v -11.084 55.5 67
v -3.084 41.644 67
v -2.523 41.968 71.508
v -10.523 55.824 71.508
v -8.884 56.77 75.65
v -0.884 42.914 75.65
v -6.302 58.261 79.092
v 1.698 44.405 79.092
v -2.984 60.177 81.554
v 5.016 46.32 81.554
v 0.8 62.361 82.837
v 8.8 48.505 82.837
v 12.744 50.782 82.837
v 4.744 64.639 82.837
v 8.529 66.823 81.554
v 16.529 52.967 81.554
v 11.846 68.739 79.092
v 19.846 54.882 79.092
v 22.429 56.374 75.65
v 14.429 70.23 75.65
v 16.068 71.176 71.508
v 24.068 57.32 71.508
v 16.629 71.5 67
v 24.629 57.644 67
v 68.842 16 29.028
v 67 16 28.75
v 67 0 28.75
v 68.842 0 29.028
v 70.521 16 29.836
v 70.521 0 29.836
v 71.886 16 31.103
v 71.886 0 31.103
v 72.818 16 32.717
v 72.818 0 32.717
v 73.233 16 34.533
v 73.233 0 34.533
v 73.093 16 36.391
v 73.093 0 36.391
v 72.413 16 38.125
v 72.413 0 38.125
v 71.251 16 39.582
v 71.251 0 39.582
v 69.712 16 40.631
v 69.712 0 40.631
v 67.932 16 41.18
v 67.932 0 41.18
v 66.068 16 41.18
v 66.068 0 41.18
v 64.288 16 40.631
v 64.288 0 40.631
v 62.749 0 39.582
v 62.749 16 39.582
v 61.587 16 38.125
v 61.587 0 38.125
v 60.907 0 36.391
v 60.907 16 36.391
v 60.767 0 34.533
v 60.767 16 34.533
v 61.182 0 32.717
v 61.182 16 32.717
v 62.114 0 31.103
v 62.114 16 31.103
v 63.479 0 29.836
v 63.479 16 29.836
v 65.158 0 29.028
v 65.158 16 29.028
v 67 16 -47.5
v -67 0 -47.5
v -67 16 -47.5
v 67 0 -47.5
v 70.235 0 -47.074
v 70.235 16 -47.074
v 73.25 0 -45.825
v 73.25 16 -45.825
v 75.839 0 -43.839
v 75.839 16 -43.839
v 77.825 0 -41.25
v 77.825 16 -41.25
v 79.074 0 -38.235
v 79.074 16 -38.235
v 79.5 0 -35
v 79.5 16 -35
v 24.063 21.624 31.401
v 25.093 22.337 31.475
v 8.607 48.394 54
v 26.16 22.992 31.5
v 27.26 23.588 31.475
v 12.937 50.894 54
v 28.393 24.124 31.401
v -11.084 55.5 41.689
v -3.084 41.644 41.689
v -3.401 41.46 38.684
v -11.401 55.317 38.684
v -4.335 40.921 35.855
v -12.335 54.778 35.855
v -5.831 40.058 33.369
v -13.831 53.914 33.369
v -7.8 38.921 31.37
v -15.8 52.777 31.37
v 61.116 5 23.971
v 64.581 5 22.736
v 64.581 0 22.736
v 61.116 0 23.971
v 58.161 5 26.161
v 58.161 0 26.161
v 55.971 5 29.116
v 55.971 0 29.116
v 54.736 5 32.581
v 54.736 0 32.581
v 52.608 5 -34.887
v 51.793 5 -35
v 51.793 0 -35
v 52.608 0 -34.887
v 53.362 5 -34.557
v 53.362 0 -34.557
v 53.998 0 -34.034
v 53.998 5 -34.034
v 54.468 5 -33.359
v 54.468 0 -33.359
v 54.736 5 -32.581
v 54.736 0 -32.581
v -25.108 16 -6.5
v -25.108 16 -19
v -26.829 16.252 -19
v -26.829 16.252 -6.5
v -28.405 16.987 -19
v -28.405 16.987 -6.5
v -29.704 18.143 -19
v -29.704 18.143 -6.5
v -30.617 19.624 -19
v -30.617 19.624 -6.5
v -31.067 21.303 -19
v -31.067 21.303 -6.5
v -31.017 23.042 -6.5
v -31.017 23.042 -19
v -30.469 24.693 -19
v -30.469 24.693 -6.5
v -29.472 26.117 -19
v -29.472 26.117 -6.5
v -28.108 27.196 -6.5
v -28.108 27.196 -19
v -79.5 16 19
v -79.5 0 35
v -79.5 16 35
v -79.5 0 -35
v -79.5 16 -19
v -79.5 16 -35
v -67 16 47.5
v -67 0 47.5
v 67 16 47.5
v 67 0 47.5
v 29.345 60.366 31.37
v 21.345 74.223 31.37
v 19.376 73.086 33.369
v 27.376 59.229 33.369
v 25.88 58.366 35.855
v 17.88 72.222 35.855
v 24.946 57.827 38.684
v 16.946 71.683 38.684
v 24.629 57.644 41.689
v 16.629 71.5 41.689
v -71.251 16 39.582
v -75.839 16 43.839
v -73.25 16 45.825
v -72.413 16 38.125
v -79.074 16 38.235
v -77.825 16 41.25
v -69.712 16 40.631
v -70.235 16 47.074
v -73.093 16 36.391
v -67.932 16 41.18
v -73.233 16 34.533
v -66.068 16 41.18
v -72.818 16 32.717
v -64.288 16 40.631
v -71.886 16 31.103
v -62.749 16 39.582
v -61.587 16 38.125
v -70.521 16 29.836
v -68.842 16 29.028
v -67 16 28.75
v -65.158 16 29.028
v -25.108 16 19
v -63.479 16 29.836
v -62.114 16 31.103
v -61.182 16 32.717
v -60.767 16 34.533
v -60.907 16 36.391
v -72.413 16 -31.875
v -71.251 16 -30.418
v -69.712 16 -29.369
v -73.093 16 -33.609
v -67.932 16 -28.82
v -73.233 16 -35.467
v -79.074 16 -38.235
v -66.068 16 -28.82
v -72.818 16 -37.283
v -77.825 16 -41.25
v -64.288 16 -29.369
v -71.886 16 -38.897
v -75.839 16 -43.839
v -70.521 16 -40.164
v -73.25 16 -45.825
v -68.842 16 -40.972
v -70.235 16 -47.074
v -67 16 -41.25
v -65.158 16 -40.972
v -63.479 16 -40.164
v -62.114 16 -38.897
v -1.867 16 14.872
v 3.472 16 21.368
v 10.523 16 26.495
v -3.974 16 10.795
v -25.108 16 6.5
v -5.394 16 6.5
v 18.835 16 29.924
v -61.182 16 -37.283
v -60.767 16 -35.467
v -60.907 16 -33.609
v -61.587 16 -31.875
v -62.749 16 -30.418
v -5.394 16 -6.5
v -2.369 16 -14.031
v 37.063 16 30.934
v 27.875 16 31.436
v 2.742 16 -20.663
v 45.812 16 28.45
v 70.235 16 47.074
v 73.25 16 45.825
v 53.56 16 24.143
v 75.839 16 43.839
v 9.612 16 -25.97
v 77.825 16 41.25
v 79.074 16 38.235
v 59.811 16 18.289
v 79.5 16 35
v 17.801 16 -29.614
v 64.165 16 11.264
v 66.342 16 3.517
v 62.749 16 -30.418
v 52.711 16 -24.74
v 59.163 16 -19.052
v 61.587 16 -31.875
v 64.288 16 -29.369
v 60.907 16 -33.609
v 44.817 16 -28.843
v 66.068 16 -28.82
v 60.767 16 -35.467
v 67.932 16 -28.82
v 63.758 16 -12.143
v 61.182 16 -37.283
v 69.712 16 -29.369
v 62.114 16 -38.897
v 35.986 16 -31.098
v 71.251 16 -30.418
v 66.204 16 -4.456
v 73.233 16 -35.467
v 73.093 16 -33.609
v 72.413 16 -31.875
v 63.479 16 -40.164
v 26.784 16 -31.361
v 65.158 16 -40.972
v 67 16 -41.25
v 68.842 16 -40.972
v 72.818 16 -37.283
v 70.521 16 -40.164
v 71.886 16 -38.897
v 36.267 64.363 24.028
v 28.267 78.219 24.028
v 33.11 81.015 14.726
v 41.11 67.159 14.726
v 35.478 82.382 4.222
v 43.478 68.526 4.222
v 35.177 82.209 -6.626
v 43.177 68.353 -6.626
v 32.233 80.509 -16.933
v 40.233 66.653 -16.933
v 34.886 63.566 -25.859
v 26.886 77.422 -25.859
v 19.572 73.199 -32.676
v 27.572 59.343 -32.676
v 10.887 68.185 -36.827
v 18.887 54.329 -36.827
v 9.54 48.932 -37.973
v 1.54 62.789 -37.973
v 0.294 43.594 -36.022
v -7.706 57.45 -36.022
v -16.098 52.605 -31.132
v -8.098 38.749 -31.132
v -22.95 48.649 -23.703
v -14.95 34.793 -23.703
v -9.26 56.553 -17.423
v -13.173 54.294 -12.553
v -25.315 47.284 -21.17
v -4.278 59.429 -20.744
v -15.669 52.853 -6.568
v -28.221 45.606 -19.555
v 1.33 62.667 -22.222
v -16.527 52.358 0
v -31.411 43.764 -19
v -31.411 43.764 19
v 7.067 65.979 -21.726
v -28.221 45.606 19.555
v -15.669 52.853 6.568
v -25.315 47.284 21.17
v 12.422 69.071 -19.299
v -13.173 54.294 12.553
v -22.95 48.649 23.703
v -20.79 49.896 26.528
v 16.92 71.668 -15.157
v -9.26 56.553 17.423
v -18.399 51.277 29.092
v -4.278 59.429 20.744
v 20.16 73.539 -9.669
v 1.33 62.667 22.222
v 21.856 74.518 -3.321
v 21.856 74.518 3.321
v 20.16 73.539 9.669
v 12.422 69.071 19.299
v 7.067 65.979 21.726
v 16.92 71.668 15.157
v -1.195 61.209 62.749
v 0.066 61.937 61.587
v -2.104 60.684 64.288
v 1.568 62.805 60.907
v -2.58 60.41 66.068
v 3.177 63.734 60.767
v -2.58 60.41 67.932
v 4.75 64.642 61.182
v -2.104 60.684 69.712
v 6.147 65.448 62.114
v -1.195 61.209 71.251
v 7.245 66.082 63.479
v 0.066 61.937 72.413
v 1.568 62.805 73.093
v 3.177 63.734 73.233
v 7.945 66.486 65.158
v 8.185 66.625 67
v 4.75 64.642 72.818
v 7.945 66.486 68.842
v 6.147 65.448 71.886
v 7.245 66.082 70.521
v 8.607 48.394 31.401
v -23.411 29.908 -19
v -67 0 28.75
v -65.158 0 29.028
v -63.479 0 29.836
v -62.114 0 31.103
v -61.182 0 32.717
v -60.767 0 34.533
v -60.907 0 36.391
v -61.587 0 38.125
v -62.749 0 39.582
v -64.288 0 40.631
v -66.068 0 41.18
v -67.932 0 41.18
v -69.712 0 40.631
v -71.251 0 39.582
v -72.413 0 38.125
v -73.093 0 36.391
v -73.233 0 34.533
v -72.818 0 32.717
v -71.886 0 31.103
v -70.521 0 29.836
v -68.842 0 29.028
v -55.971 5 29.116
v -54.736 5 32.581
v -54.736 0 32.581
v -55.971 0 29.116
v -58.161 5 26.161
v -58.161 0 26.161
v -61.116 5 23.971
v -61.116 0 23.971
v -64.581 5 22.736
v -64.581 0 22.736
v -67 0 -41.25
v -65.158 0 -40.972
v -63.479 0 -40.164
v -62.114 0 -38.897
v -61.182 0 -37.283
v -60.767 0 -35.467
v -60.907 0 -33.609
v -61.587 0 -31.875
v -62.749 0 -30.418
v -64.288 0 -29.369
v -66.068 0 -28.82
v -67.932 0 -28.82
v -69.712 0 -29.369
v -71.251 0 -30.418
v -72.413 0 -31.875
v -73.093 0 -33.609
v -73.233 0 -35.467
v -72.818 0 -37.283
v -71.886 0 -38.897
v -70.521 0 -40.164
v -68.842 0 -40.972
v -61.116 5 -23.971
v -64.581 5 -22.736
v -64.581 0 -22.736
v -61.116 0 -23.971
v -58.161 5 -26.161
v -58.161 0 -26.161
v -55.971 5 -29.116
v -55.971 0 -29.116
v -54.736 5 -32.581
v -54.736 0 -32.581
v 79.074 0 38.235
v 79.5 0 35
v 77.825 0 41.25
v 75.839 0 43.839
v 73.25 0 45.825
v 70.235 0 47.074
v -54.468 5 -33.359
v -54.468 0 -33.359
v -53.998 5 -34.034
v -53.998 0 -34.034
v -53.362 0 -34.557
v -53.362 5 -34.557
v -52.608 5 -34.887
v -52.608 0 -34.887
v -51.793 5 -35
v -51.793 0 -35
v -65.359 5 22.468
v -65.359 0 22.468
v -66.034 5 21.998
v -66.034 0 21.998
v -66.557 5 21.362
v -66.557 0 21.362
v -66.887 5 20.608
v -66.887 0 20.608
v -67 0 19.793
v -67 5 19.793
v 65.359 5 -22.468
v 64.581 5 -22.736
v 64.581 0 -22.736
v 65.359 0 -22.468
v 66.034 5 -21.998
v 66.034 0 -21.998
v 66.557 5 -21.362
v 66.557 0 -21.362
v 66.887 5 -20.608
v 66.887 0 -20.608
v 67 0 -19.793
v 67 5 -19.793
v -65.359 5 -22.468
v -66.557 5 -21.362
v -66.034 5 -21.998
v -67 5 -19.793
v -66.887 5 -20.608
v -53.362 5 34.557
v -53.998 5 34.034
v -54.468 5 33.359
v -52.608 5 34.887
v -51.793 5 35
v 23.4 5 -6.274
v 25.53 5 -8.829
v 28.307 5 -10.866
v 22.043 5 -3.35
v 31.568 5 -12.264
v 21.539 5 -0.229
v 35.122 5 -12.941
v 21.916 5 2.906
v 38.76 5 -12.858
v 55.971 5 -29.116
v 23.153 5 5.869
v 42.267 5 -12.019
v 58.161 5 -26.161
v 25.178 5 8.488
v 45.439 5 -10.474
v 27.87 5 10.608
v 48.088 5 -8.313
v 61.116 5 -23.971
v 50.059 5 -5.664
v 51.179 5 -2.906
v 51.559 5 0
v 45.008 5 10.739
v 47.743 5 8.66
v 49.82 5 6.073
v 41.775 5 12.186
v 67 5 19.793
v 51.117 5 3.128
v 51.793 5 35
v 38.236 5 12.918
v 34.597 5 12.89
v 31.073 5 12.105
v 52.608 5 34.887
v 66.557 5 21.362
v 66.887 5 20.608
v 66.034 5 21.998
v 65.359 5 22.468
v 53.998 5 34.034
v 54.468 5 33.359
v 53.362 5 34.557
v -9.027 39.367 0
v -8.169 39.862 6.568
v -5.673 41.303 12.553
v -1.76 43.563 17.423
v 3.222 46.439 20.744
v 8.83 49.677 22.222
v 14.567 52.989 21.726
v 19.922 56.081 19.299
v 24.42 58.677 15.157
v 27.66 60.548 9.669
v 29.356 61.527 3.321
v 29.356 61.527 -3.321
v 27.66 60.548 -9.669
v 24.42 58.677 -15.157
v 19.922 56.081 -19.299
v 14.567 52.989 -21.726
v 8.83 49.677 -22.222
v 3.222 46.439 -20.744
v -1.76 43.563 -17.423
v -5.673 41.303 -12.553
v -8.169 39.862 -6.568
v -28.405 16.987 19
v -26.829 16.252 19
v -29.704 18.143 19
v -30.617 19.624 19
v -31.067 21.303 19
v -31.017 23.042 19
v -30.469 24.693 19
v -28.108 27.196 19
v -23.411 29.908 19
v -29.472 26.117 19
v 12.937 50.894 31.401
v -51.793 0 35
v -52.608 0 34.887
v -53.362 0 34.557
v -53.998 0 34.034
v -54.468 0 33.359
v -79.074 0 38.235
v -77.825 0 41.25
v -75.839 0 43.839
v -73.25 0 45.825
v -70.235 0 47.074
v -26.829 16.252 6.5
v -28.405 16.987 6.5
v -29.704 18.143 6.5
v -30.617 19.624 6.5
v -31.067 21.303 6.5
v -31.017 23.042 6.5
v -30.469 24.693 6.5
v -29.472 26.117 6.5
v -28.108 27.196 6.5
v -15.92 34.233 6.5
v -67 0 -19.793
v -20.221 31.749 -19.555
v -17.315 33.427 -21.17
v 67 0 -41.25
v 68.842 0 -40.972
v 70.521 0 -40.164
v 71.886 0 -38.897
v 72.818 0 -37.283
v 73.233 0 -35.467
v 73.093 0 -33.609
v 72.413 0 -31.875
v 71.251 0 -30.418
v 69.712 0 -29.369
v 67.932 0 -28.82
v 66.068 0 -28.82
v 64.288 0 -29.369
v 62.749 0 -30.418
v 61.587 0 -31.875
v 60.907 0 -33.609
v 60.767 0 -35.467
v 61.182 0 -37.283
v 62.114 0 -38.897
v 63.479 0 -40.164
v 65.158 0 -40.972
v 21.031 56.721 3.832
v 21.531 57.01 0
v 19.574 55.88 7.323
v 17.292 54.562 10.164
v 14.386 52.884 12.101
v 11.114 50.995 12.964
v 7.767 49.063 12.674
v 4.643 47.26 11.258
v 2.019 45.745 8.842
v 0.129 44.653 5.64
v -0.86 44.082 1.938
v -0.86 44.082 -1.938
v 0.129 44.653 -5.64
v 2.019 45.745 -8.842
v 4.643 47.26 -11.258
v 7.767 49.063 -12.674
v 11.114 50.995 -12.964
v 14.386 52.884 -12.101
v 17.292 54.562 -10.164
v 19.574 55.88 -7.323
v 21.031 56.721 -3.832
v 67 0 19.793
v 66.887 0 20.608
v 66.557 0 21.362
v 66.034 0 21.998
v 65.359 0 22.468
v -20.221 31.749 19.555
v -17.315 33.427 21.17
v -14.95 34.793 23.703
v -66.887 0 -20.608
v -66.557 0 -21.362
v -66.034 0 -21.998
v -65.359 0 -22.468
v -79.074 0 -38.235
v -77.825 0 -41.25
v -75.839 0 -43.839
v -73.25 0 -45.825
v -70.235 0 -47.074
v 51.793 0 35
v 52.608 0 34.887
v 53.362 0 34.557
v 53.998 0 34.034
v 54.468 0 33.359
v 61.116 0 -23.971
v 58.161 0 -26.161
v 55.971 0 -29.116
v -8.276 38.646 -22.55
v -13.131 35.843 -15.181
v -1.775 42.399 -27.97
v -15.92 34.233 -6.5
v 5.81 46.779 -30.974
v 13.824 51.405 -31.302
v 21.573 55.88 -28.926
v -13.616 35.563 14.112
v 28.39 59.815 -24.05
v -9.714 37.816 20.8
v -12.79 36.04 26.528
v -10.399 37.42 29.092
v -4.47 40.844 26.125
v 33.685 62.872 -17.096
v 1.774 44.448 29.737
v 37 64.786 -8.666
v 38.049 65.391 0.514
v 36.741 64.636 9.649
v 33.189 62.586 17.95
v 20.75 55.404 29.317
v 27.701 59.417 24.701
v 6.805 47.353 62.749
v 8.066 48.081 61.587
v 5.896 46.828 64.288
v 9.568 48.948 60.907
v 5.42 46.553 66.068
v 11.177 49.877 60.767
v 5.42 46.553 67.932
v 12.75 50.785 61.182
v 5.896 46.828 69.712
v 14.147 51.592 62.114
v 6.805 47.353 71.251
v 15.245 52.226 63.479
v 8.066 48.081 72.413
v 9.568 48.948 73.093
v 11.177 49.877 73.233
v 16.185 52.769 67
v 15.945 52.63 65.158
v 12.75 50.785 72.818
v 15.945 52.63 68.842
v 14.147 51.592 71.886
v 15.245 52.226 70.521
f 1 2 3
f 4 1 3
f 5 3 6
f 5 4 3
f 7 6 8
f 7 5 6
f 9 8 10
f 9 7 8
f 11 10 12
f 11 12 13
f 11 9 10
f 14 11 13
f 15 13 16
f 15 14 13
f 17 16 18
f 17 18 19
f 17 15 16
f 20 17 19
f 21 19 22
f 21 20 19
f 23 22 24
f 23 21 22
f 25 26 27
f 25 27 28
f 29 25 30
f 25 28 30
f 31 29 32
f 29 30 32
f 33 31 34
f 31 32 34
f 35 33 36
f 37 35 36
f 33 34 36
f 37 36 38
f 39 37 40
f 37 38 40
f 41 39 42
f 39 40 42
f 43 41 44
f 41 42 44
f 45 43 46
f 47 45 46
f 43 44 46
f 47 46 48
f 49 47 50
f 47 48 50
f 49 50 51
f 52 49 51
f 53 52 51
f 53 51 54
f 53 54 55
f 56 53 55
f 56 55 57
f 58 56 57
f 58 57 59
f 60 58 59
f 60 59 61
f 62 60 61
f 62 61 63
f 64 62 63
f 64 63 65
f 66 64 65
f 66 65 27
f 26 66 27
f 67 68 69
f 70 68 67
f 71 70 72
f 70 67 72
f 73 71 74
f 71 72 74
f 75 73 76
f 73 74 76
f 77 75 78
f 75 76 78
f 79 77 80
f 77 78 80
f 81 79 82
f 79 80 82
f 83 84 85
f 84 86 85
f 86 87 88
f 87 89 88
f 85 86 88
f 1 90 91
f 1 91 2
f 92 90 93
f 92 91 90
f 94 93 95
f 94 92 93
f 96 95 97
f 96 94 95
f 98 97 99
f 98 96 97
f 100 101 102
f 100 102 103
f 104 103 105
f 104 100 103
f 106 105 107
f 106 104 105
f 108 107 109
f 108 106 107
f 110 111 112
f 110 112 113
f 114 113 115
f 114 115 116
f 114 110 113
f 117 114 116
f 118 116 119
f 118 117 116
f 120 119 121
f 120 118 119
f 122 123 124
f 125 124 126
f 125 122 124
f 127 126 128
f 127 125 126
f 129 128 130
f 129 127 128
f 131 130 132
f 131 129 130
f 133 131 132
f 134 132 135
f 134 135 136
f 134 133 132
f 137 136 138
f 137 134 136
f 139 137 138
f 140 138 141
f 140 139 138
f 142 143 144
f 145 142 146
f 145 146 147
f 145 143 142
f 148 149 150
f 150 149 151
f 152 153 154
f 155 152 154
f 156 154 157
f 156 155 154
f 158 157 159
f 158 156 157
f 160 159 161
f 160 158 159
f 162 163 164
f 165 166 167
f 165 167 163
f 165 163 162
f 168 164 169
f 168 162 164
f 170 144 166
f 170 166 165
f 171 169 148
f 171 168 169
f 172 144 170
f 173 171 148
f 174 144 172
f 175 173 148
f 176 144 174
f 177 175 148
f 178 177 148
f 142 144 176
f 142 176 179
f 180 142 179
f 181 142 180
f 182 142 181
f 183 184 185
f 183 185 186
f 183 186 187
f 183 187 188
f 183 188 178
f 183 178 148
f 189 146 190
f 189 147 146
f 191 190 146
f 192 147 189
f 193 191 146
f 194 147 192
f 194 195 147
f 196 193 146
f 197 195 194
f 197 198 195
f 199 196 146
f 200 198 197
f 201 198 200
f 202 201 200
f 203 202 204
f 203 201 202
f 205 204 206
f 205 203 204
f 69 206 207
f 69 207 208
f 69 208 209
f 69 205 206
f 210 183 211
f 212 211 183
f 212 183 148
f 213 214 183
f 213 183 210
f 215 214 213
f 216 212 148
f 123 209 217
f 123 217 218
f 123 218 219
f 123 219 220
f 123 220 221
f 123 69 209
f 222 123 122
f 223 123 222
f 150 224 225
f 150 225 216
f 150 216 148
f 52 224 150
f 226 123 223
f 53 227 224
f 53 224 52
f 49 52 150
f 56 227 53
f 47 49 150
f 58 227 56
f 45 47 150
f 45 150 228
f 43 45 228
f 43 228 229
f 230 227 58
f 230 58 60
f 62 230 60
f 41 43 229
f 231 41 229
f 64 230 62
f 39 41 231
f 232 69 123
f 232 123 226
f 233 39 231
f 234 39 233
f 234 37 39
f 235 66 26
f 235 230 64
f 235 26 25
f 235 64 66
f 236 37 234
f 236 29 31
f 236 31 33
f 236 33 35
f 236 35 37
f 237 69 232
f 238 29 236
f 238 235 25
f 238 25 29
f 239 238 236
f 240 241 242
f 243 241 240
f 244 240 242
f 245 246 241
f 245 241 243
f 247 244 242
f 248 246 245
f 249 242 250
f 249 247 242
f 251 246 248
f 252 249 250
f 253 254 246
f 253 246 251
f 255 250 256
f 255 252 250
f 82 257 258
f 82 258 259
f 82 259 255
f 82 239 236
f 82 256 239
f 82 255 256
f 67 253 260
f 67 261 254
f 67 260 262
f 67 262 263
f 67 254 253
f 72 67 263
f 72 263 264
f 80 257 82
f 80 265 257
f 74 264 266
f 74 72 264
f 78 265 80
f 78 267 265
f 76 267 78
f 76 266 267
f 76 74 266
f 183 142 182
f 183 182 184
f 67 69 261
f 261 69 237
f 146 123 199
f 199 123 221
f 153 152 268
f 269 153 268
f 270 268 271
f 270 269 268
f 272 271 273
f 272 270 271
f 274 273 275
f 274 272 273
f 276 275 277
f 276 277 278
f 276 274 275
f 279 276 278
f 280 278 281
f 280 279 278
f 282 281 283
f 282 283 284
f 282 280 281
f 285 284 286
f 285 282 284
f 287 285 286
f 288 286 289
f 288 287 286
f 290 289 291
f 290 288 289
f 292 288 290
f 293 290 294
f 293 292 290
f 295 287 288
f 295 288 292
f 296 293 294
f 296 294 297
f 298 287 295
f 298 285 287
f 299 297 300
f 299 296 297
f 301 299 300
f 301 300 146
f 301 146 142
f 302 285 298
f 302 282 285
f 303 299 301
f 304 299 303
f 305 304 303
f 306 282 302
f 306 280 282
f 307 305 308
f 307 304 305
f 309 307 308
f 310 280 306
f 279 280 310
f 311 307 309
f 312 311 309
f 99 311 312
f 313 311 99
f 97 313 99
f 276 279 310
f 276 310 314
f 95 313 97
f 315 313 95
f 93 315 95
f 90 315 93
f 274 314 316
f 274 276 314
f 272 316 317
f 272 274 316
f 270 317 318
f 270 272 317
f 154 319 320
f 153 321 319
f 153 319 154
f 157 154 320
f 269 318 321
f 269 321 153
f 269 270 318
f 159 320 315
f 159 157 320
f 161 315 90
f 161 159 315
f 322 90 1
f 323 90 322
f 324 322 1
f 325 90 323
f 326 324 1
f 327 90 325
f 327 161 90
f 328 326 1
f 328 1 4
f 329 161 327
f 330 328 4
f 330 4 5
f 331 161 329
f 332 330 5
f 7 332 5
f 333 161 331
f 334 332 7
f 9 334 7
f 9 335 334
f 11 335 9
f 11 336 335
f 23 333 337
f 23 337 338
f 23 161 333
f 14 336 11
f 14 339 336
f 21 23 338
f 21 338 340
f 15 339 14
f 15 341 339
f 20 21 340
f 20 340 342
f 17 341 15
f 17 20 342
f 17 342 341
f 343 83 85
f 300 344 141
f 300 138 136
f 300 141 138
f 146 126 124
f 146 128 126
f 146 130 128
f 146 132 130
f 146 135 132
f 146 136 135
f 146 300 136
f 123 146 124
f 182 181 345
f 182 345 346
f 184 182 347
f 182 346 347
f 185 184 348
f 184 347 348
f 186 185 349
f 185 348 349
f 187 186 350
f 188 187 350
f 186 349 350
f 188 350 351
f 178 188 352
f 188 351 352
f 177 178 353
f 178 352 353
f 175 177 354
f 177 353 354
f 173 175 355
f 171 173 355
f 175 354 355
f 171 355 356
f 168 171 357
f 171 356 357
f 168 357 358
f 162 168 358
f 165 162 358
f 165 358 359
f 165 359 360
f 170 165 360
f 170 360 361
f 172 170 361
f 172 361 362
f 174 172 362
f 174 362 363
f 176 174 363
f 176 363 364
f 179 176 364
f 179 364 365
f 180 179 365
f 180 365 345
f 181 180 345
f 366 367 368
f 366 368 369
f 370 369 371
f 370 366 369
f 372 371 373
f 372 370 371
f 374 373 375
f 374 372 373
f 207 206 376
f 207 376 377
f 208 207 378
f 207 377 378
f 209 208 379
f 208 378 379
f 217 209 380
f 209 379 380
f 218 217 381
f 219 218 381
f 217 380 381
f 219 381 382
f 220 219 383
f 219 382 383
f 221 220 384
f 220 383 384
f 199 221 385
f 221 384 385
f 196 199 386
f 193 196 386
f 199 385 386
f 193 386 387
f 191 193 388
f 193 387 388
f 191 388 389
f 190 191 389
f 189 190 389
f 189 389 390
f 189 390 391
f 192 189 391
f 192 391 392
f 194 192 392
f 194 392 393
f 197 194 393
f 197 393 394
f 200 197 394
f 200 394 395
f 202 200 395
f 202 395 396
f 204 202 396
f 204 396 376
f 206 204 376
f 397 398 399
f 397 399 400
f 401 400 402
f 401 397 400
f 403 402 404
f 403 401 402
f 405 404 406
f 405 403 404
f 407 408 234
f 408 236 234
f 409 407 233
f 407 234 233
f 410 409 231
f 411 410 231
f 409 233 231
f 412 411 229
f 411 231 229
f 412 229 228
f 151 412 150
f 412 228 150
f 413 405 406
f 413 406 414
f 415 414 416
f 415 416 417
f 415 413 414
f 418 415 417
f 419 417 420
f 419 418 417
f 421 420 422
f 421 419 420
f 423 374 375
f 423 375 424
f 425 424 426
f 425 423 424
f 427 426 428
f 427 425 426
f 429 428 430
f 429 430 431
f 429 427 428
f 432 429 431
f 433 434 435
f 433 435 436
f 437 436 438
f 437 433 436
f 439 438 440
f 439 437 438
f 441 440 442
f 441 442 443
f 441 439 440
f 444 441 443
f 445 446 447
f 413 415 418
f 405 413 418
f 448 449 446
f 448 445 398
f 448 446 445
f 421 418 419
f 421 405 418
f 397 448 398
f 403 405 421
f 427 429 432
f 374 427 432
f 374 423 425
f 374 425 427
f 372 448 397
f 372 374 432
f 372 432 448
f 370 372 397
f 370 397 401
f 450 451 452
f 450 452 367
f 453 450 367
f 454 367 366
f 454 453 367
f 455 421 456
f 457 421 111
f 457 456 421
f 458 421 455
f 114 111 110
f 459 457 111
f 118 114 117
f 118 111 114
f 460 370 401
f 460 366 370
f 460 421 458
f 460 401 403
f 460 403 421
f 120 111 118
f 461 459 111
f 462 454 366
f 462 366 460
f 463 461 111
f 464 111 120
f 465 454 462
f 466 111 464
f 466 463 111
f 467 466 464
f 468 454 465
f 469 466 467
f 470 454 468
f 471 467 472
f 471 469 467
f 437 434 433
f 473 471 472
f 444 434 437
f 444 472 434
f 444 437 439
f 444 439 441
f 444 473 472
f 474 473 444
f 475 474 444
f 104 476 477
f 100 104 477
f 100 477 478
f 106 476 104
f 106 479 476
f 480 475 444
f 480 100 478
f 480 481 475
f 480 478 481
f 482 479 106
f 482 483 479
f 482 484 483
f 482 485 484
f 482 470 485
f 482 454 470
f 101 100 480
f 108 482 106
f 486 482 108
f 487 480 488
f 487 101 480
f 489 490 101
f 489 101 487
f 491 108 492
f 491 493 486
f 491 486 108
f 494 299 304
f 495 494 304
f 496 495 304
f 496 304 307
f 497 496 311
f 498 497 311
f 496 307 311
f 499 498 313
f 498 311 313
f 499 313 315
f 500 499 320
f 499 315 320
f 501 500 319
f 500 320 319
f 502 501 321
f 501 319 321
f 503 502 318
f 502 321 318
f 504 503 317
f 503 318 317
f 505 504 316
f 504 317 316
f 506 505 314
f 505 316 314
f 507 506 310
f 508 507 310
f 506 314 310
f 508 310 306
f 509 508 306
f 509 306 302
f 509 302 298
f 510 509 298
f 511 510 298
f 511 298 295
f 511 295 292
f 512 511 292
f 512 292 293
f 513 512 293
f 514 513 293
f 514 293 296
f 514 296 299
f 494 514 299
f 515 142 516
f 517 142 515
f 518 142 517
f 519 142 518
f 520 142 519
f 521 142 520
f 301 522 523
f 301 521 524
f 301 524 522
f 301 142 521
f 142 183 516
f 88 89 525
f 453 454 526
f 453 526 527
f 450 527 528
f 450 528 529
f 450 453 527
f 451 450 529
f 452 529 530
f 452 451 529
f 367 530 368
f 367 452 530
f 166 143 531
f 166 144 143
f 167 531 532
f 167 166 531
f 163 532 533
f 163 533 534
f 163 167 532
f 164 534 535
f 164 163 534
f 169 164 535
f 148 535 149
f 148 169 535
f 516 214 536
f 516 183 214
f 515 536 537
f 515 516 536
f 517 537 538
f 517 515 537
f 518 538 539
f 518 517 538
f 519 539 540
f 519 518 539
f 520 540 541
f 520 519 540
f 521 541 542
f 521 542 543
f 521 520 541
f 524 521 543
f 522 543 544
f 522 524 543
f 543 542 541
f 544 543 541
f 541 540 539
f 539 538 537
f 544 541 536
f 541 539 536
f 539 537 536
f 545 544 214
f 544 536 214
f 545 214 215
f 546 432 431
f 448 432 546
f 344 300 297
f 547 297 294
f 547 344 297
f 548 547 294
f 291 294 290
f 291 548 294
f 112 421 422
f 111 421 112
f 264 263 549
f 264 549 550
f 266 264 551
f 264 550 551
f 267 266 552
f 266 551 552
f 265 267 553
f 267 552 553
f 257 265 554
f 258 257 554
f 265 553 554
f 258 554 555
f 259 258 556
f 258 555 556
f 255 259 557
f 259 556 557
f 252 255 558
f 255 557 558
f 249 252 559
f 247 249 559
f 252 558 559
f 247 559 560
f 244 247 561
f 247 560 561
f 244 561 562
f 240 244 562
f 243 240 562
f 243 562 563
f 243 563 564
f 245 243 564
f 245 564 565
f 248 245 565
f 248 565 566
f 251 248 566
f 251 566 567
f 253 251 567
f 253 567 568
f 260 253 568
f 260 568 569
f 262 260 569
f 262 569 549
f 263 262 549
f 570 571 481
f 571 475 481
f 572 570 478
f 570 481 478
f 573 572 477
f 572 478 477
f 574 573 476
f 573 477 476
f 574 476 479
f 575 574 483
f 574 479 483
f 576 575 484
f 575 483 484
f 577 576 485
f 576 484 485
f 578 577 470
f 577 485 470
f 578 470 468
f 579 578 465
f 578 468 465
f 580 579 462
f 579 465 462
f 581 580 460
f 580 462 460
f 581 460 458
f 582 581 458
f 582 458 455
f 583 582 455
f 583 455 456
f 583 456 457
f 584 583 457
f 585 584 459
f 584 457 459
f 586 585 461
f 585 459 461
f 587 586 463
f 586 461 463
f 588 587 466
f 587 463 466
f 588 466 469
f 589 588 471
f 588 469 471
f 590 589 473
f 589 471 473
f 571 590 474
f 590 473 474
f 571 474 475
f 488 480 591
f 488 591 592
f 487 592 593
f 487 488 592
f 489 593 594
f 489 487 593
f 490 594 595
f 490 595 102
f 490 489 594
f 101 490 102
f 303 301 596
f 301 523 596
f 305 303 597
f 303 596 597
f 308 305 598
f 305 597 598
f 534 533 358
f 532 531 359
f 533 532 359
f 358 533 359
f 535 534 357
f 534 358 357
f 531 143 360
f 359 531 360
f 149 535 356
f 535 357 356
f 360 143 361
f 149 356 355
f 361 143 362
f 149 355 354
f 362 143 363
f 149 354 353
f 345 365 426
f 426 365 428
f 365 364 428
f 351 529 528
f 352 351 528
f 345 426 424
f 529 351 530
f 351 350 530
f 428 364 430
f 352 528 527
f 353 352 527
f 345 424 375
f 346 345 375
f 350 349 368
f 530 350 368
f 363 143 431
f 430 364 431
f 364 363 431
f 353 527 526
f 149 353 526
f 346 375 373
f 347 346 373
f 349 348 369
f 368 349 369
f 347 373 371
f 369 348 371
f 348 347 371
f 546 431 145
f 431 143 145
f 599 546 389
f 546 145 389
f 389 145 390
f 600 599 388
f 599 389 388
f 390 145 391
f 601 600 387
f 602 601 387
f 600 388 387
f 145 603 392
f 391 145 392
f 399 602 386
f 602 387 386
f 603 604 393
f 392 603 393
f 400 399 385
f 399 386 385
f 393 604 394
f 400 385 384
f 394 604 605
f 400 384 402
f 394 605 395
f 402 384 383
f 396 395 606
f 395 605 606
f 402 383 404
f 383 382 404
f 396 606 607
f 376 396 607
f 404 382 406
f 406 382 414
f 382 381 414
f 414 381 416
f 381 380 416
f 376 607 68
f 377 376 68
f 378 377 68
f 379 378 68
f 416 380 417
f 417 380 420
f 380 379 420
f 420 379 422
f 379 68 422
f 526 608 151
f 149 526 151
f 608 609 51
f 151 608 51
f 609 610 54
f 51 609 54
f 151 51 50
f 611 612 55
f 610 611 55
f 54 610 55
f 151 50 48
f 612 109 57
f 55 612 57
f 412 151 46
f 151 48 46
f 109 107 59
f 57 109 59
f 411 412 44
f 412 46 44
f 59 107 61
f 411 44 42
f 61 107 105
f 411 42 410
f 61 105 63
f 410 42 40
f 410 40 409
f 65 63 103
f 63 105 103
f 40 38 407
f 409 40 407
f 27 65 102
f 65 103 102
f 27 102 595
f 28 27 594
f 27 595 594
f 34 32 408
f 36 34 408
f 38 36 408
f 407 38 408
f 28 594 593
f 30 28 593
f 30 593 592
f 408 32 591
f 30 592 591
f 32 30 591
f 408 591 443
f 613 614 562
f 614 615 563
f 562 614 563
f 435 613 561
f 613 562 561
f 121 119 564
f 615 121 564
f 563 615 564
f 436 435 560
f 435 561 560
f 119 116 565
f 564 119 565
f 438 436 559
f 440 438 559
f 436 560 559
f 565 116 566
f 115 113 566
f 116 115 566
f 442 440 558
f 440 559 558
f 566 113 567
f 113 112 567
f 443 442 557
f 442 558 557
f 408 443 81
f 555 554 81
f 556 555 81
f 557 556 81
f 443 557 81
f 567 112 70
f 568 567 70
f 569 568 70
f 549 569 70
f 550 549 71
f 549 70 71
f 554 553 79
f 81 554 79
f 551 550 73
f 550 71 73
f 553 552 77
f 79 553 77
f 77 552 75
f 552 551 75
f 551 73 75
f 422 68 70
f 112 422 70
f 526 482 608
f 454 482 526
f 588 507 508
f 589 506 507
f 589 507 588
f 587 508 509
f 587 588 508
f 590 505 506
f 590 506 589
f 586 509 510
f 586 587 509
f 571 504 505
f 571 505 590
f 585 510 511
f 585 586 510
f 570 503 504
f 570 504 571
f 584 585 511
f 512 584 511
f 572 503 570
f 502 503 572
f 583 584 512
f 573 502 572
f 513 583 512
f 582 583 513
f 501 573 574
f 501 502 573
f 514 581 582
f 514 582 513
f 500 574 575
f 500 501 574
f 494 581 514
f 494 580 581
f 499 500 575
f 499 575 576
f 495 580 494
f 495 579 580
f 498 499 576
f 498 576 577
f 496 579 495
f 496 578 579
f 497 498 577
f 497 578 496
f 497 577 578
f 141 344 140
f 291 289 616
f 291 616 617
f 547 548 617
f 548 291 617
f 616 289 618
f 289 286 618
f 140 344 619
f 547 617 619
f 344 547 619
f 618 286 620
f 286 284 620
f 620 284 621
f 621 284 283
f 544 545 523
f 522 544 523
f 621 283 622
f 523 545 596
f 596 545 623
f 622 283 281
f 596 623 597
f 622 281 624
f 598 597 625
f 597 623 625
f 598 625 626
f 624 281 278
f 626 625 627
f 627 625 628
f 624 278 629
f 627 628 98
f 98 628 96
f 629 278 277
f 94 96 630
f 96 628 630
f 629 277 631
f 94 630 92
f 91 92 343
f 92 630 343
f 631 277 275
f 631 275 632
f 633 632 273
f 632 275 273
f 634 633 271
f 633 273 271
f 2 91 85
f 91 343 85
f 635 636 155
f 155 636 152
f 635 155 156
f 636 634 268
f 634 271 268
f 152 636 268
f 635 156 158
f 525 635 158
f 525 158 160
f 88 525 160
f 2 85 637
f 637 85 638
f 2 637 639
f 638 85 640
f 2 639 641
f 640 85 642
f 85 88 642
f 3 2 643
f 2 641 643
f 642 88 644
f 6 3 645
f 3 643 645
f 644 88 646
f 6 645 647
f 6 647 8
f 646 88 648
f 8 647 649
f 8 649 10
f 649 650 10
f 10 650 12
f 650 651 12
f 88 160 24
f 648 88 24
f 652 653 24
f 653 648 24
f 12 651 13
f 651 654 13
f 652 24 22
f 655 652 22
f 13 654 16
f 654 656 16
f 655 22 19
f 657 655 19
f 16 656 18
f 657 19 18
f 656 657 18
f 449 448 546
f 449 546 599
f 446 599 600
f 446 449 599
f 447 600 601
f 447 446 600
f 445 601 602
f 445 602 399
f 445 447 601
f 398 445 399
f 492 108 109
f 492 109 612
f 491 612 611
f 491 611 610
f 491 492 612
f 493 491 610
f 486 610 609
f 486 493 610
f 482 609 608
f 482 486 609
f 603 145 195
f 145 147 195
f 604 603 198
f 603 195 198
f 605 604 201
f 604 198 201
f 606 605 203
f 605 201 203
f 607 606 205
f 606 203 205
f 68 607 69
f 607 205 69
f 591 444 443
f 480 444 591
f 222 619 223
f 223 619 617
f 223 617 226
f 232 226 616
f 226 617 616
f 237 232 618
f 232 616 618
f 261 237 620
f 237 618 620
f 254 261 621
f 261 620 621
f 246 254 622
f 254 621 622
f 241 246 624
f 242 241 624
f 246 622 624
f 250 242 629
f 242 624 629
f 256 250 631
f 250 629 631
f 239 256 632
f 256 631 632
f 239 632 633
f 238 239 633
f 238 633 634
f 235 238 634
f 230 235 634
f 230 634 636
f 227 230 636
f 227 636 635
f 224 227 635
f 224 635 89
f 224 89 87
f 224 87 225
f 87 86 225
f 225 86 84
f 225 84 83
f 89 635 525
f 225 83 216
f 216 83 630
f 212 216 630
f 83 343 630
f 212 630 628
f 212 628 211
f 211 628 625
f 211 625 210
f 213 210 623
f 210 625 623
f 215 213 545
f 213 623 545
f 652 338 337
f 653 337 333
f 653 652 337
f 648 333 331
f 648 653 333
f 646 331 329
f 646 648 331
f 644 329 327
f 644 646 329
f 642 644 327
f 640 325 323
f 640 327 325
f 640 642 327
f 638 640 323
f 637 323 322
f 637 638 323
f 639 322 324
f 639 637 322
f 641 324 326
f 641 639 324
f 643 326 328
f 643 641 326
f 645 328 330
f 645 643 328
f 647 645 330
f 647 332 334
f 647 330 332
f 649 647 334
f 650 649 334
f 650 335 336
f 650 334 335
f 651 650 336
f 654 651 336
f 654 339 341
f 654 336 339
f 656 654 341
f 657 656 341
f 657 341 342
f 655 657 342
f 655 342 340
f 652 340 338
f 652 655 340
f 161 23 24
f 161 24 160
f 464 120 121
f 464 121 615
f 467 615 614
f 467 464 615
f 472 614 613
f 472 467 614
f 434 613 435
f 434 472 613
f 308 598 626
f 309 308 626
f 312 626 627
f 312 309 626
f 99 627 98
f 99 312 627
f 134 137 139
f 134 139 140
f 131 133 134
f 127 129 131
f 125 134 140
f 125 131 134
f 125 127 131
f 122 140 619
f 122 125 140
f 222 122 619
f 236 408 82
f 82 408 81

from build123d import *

# Parameters (mm, degrees)
SKETCH2_W                                 = 159
SKETCH2_H                                 = 95
BASE_EXTRUDE_DEPTH                        = 16
BOSS_EXTRUDE1_DEPTH                       = 16
BOSS_EXTRUDE2_REACH                       = 122.054
SKETCH4_R                                 = 31.5
RIB1_REACH                                = 126.027
SKETCH5_WALL_W                            = 278.31185129
SKETCH5_WALL_H                            = 13
BOSS_EXTRUDE3_DEPTH                       = 16
SKETCH7_R                                 = 6.25
CUT_EXTRUDE1_DEPTH                        = 139.006210257
FILLET1_R                                 = 12.5
CUT_EXTRUDE2_START                        = -5
CUT_EXTRUDE2_DEPTH                        = 5
RIB2_REACH                                = 153.878
SKETCH9_WALL_W                            = 345.396032214
SKETCH9_WALL_H                            = 5
CBORE_FOR_M24_HEX_HEAD_SCREW1_D           = 26
CBORE_FOR_M24_HEX_HEAD_SCREW1_CBORE_D     = 44.569
CBORE_FOR_M24_HEX_HEAD_SCREW1_CBORE_DEPTH = 15
FILLET4_R                                 = 6
CUT_EXTRUDE3_REACH                        = 143.476
SKETCH13_R                                = 6.25


with BuildPart() as part:
    # Sketch2 → Base-Extrude (new body)
    with BuildSketch(Plane(origin=(0, 0, 0), x_dir=(1, 0, 0), z_dir=(0, 1, 0))):
        Rectangle(SKETCH2_W, SKETCH2_H)
    extrude(amount=BASE_EXTRUDE_DEPTH)

    # Sketch3 → Boss-Extrude1 (add)
    with BuildSketch(Plane(origin=(-26.80320323, 46.4245098, 0), x_dir=(0, 0, -1), z_dir=(0.499999999999998, -0.8660254037844398, 0))):
        with BuildLine():
            Line((-19, -60.849019601), (-19, 1.242015055))
            ThreePointArc((-19, 1.242015055), (0, 72.150980399), (19, 1.242015055))
            Line((19, 1.242015055), (19, -60.849019601))
            Line((19, -60.849019601), (-19, -60.849019601))
        make_face()
    extrude(amount=BOSS_EXTRUDE1_DEPTH)

    # Boss-Extrude2: up to this plane
    boss_extrude2_end = Plane(origin=(-79.5, 16, -47.5), z_dir=(0, -1, 0))
    # Sketch4 → Boss-Extrude2 (add, up to the surface)
    with BuildSketch(Plane(origin=(-18.80320323, 32.56810334, 0), x_dir=(0.8660254037844398, 0.49999999999999806, 0), z_dir=(0.499999999999998, -0.8660254037844397, 0)), mode=Mode.PRIVATE) as boss_extrude2_sk1:
        with Locations(Location((34.150980399, 0, 0), (0, 0, 180))):
            Circle(SKETCH4_R)
    boss_extrude2_tool1 = split(extrude(boss_extrude2_sk1.sketch, amount=BOSS_EXTRUDE2_REACH, mode=Mode.PRIVATE), bisect_by=boss_extrude2_end, keep=Keep.BOTH, mode=Mode.PRIVATE)
    add(boss_extrude2_tool1.solids().sort_by_distance((10.772413, 49.643594, 0))[0])

    # Sketch5 wall → Rib1 (add, up to next)
    with BuildSketch(Plane(origin=(-22.439717295, 16, 0), x_dir=(1, 0, 0), z_dir=(0, 1, 0)), mode=Mode.PRIVATE) as rib1_sk1:
        Rectangle(SKETCH5_WALL_W, SKETCH5_WALL_H)
    rib1_tool1 = extrude(rib1_sk1.sketch, amount=RIB1_REACH, mode=Mode.PRIVATE) - part.part
    add(rib1_tool1.solids().sort_by_distance((-22.439717295, 16, 0))[0])

    # Sketch6 → Boss-Extrude3 (add)
    with BuildSketch(Plane(origin=(-26.80320323, 46.4245098, 0), x_dir=(-0.8660254037844398, -0.49999999999999806, 0), z_dir=(-0.499999999999998, 0.8660254037844397, 0))):
        with BuildLine():
            Line((-18.150980399, 34.467375879), (-18.150980399, 67))
            ThreePointArc((-18.150980399, 67), (-34.150980399, 83), (-50.150980399, 67))
            Line((-50.150980399, 67), (-50.150980399, 34.467375879))
            ThreePointArc((-50.150980399, 34.467375879), (-34.150980399, 38), (-18.150980399, 34.467375879))
        make_face()
    extrude(amount=-BOSS_EXTRUDE3_DEPTH)

    # Sketch7 → Cut-Extrude1 (cut, through all)
    with BuildSketch(Plane(origin=(-18.80320323, 32.56810334, 0), x_dir=(-0.8660254037844398, -0.49999999999999806, 0), z_dir=(-0.499999999999998, 0.8660254037844397, 0))):
        with Locations(Location((-34.150980399, 67, 0), (0, 0, 180))):
            Circle(SKETCH7_R)
    extrude(amount=CUT_EXTRUDE1_DEPTH, mode=Mode.SUBTRACT)

    # Fillet1
    fillet1_edges = [part.edges().sort_by_distance(p)[0] for p in [
        (-21.72758664, 40.117314098, 19),
        (-21.72758664, 40.117314098, -19),
        (20.62881982, 64.57179677, 34.467375879),
        (-7.083993101, 48.57179677, 34.467375879),
        (-79.5, 8, -47.5),
        (79.5, 8, -47.5),
        (79.5, 8, 47.5),
        (-79.5, 8, 47.5),
    ]]
    fillet(fillet1_edges, radius=FILLET1_R)

    # Sketch8 → Cut-Extrude2 (cut)
    with BuildSketch(Plane.XZ.offset(CUT_EXTRUDE2_START)):
        with BuildLine():
            Line((-51.793093674, -35), (51.793093674, -35))
            ThreePointArc((51.793093674, -35), (53.698095579, -34.317534842), (54.736365866, -32.580645161))
            ThreePointArc((54.736365866, -32.580645161), (58.161165235, -26.161165235), (64.580645161, -22.736365866))
            ThreePointArc((64.580645161, -22.736365866), (66.317534842, -21.698095579), (67, -19.793093674))
            Line((67, -19.793093674), (67, 19.793093674))
            ThreePointArc((67, 19.793093674), (66.317534842, 21.698095579), (64.580645161, 22.736365866))
            ThreePointArc((64.580645161, 22.736365866), (58.161165235, 26.161165235), (54.736365866, 32.580645161))
            ThreePointArc((54.736365866, 32.580645161), (53.698095579, 34.317534842), (51.793093674, 35))
            Line((51.793093674, 35), (-51.793093674, 35))
            ThreePointArc((-51.793093674, 35), (-53.698095579, 34.317534842), (-54.736365866, 32.580645161))
            ThreePointArc((-54.736365866, 32.580645161), (-58.161165235, 26.161165235), (-64.580645161, 22.736365866))
            ThreePointArc((-64.580645161, 22.736365866), (-66.317534842, 21.698095579), (-67, 19.793093674))
            Line((-67, 19.793093674), (-67, -19.793093674))
            ThreePointArc((-67, -19.793093674), (-66.317534842, -21.698095579), (-64.580645161, -22.736365866))
            ThreePointArc((-64.580645161, -22.736365866), (-58.161165235, -26.161165235), (-54.736365866, -32.580645161))
            ThreePointArc((-54.736365866, -32.580645161), (-53.698095579, -34.317534842), (-51.793093674, -35))
        make_face()
    extrude(amount=CUT_EXTRUDE2_DEPTH, mode=Mode.SUBTRACT)

    # Sketch9 wall → Rib2 (add, up to next)
    with BuildSketch(Plane(origin=(18.77241336, 35.787187078, 42.302042556), x_dir=(-0.40362765533, 0.699103606369, 0.590202391909), z_dir=(-0.295101195954, 0.511130264767, -0.807255310658)), mode=Mode.PRIVATE) as rib2_sk1:
        Rectangle(SKETCH9_WALL_W, SKETCH9_WALL_H)
    rib2_tool1 = extrude(rib2_sk1.sketch, amount=RIB2_REACH, mode=Mode.PRIVATE) - part.part
    add(rib2_tool1.solids().sort_by_distance((18.77241336, 35.787187078, 42.302042556))[0])

    # CBORE for M24 Hex Head Screw1 (through all)
    with Locations(Plane(origin=(-26.80320323, 46.4245098, 0), x_dir=(-0.8660254037844398, -0.49999999999999806, 0), z_dir=(-0.499999999999998, 0.8660254037844397, 0))):
        with Locations((-34.150980399, 0)):
            CounterBoreHole(CBORE_FOR_M24_HEX_HEAD_SCREW1_D / 2, CBORE_FOR_M24_HEX_HEAD_SCREW1_CBORE_D / 2, CBORE_FOR_M24_HEX_HEAD_SCREW1_CBORE_DEPTH)

    # Fillet4
    fillet4_edges = [part.edges().sort_by_distance(p)[0] for p in [
        (-47.5, 16, -12.75),
        (-47.5, 16, 12.75),
    ]]
    fillet(fillet4_edges, radius=FILLET4_R)

    # Sketch13 → Cut-Extrude3 (cut, up to next)
    with BuildSketch(Plane.XZ, mode=Mode.PRIVATE) as cut_extrude3_sk1:
        with Locations(Location((67, 35, 0), (0, 0, 270))):
            Circle(SKETCH13_R)
    cut_extrude3_tool1 = extrude(cut_extrude3_sk1.sketch, amount=-CUT_EXTRUDE3_REACH, mode=Mode.PRIVATE) & part.part
    # Sketch13 → Cut-Extrude3 (cut, up to next)
    with BuildSketch(Plane.XZ, mode=Mode.PRIVATE) as cut_extrude3_sk2:
        with Locations(Location((67, -35, 0), (0, 0, 270))):
            Circle(SKETCH13_R)
    cut_extrude3_tool2 = extrude(cut_extrude3_sk2.sketch, amount=-CUT_EXTRUDE3_REACH, mode=Mode.PRIVATE) & part.part
    # Sketch13 → Cut-Extrude3 (cut, up to next)
    with BuildSketch(Plane.XZ, mode=Mode.PRIVATE) as cut_extrude3_sk3:
        with Locations(Location((-67, -35, 0), (0, 0, 270))):
            Circle(SKETCH13_R)
    cut_extrude3_tool3 = extrude(cut_extrude3_sk3.sketch, amount=-CUT_EXTRUDE3_REACH, mode=Mode.PRIVATE) & part.part
    # Sketch13 → Cut-Extrude3 (cut, up to next)
    with BuildSketch(Plane.XZ, mode=Mode.PRIVATE) as cut_extrude3_sk4:
        with Locations(Location((-67, 35, 0), (0, 0, 270))):
            Circle(SKETCH13_R)
    cut_extrude3_tool4 = extrude(cut_extrude3_sk4.sketch, amount=-CUT_EXTRUDE3_REACH, mode=Mode.PRIVATE) & part.part
    add(cut_extrude3_tool1.solids().sort_by_distance((67, 0, 35))[0], mode=Mode.SUBTRACT)
    add(cut_extrude3_tool2.solids().sort_by_distance((67, 0, -35))[0], mode=Mode.SUBTRACT)
    add(cut_extrude3_tool3.solids().sort_by_distance((-67, 0, -35))[0], mode=Mode.SUBTRACT)
    add(cut_extrude3_tool4.solids().sort_by_distance((-67, 0, 35))[0], mode=Mode.SUBTRACT)


solid = part.part
